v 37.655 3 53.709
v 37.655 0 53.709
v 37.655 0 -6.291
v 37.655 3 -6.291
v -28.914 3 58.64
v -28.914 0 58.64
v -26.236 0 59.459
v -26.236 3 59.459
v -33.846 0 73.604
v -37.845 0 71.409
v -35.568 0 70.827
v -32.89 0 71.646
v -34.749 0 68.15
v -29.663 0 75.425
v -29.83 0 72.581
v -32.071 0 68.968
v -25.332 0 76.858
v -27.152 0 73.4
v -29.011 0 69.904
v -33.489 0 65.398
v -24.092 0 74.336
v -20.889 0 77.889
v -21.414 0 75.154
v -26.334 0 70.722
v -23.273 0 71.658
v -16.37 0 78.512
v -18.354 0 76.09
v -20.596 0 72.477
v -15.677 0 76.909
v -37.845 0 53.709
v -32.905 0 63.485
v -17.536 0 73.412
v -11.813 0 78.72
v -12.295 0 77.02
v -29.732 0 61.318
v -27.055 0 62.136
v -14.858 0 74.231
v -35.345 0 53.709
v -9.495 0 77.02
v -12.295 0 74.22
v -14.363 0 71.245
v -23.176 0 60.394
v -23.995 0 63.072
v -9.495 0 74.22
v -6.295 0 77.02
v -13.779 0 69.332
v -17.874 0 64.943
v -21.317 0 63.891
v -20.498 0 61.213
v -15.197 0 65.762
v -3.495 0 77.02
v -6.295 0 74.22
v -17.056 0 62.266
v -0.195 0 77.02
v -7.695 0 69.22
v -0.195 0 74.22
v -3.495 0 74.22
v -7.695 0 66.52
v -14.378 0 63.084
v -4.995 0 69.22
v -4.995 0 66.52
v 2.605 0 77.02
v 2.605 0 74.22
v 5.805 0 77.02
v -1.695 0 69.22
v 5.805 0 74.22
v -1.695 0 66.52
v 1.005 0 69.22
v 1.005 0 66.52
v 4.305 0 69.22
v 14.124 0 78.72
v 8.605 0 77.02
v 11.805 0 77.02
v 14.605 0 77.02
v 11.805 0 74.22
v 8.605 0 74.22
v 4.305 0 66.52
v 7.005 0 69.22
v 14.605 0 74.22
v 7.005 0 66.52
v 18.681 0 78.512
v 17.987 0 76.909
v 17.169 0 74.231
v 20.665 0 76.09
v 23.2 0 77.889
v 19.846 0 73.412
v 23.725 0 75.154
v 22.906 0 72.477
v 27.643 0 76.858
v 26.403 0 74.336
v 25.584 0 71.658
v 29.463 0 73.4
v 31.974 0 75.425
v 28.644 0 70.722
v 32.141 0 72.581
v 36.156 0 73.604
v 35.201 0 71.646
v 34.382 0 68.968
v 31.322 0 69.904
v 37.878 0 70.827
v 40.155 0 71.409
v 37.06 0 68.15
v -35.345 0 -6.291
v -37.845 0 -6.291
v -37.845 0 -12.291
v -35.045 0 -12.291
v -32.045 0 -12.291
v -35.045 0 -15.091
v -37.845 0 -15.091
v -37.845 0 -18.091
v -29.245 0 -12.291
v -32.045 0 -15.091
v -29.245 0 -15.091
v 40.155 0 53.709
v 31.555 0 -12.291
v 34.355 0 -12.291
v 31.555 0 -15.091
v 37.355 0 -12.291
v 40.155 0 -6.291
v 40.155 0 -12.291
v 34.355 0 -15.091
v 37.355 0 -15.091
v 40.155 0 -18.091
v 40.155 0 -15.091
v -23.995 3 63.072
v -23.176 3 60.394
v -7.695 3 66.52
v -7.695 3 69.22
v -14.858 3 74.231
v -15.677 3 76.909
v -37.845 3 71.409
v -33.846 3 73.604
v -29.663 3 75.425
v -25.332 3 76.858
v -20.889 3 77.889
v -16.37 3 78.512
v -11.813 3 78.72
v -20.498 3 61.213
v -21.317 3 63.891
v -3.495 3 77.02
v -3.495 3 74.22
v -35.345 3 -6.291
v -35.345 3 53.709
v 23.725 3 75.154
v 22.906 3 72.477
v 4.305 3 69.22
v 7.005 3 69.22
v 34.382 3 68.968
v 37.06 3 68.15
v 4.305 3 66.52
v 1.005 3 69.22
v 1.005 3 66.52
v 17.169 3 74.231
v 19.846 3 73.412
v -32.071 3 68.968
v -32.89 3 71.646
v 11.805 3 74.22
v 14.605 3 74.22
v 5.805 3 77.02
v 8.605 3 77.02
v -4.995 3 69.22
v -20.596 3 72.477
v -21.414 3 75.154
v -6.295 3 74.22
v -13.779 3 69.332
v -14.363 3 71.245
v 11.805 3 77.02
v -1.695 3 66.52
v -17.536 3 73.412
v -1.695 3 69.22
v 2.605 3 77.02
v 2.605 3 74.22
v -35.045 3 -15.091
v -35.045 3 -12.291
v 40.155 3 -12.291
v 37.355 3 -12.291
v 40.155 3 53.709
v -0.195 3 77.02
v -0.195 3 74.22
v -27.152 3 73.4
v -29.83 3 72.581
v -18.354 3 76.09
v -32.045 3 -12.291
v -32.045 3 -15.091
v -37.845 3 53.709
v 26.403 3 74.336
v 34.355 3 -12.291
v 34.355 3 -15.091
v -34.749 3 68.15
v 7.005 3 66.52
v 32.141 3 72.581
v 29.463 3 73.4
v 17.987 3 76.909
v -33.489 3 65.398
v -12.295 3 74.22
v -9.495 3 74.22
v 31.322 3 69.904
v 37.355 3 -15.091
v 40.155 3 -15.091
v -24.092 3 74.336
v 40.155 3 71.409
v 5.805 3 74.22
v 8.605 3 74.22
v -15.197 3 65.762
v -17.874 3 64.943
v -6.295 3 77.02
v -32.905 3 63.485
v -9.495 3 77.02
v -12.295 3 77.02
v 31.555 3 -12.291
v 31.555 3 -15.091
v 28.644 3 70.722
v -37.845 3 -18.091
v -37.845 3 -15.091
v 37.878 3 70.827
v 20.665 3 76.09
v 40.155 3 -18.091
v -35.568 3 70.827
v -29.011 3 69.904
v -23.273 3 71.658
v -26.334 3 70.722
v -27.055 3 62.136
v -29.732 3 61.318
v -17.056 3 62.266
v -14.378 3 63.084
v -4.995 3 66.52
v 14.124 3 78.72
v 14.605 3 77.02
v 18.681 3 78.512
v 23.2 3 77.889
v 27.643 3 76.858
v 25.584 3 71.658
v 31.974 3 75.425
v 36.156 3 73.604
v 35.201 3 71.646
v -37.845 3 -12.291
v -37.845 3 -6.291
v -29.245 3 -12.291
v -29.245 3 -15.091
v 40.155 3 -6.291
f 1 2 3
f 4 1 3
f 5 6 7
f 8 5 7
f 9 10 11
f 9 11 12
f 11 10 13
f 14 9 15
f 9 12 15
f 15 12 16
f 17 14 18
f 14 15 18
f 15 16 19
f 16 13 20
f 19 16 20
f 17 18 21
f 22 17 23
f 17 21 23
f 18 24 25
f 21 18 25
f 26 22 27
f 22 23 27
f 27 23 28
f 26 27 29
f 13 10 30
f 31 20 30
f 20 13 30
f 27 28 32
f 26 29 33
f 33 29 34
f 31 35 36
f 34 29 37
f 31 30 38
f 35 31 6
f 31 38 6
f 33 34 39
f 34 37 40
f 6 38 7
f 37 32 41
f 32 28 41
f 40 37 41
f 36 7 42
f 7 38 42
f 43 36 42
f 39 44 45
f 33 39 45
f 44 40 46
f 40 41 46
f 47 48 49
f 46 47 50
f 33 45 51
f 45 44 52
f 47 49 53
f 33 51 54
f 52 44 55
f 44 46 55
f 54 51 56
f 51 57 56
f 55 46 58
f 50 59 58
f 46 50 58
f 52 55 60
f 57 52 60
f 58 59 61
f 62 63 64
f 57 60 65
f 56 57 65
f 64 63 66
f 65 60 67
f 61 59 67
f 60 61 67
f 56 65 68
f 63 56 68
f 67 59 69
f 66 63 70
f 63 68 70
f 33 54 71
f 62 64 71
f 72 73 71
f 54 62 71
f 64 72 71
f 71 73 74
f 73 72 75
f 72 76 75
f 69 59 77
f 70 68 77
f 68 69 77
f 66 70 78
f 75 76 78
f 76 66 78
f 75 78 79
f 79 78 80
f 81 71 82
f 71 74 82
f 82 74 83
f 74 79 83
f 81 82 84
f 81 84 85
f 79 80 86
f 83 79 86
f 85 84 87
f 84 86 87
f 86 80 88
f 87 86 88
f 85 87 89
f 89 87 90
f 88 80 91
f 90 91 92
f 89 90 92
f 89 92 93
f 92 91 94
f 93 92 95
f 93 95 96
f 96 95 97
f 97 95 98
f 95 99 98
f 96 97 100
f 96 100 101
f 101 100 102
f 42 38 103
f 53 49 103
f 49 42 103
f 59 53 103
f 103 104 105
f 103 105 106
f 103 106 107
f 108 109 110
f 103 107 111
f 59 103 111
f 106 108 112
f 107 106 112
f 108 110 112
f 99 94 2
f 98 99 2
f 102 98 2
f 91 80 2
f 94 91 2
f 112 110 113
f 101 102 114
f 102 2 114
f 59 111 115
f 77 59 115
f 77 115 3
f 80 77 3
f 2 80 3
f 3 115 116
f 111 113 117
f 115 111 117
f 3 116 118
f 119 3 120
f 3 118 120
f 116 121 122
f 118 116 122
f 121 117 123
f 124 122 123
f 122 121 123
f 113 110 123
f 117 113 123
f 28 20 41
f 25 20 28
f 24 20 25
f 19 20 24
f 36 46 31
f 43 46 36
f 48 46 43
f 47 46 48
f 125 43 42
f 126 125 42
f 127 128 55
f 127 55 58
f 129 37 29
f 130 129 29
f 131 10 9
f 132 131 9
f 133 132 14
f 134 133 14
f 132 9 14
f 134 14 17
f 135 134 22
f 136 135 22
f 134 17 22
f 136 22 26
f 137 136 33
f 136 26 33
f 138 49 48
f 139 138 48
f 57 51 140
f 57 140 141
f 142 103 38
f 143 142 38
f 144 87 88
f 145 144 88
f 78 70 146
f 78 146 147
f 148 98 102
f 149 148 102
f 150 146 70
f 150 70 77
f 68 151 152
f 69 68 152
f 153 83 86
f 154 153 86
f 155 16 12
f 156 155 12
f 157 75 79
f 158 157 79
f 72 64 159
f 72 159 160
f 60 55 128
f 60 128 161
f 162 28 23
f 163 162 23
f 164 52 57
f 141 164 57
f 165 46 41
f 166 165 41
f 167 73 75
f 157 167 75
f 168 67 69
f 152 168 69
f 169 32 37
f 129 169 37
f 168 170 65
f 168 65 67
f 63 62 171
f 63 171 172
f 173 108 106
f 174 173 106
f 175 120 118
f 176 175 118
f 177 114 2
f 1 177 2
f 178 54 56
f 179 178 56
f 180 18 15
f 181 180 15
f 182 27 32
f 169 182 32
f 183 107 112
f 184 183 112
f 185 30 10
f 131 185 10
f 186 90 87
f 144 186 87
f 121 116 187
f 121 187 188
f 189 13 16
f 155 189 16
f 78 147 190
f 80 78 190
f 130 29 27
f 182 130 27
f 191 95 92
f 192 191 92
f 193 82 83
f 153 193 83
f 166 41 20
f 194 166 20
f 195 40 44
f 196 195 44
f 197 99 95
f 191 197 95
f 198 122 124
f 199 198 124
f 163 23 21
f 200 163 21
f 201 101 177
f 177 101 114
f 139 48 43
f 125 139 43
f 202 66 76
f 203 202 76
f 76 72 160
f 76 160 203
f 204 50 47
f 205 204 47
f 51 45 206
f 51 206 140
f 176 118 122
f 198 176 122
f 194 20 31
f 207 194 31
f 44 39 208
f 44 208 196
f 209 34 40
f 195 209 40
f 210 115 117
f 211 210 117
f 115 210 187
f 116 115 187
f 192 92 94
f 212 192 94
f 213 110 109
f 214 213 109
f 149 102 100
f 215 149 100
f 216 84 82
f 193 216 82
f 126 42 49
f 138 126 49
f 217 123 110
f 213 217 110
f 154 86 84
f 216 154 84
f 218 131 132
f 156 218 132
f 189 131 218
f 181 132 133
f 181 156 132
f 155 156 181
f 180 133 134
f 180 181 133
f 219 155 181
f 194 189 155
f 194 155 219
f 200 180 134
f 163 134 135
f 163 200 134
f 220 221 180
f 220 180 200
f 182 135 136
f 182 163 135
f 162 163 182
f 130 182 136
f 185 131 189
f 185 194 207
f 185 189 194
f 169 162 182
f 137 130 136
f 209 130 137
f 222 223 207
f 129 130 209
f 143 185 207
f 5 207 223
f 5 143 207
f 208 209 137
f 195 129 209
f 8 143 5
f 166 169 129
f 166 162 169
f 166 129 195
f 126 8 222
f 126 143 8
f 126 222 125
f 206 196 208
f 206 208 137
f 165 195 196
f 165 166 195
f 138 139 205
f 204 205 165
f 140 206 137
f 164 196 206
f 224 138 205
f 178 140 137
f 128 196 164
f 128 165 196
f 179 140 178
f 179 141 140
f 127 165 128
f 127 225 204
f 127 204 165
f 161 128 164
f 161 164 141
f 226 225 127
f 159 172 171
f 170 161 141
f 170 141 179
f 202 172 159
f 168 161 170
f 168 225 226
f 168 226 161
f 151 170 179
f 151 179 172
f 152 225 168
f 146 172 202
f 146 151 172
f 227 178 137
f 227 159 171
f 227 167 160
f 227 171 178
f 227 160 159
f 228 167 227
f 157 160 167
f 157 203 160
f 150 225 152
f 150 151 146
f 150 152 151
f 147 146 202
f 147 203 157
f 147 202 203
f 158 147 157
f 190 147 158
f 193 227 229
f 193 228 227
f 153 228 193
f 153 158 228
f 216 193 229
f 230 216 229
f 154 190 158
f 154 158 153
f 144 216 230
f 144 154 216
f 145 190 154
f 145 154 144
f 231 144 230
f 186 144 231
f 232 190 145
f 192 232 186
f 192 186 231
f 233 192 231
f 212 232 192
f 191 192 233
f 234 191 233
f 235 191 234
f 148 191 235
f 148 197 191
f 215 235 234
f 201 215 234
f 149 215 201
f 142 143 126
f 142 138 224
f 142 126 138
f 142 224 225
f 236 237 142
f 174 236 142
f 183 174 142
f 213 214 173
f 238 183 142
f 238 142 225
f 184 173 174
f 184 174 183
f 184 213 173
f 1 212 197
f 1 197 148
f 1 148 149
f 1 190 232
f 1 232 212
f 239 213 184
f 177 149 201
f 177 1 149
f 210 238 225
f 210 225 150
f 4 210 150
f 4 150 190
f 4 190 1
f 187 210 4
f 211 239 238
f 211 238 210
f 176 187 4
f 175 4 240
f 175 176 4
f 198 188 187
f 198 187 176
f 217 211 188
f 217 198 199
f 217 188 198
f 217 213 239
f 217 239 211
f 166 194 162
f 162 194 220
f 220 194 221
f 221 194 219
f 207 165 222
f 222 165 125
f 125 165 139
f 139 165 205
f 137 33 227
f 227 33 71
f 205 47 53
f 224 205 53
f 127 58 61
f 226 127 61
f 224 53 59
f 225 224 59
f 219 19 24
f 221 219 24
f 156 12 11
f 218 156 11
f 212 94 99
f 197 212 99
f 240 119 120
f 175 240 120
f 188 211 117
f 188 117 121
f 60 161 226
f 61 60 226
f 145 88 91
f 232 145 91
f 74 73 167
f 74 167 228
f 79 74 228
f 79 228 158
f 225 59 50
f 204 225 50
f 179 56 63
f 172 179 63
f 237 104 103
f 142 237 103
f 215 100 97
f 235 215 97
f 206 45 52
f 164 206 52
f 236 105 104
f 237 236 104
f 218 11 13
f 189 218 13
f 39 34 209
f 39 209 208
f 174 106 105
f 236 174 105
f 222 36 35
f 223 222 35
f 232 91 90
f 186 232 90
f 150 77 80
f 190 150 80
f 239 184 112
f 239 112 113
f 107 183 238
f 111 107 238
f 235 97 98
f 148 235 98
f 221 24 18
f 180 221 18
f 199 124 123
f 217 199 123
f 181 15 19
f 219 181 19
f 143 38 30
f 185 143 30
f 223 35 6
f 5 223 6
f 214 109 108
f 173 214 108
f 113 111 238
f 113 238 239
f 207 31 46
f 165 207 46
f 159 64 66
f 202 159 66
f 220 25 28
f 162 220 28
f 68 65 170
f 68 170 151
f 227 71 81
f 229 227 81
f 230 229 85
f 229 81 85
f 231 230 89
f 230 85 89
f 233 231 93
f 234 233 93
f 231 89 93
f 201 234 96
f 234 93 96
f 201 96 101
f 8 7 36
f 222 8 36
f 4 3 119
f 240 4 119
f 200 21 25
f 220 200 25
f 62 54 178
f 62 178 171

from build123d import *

# Parameters (mm, degrees)
SKETCH1_W           = 2.8
SKETCH1_H           = 2.8
SKETCH1_W_2         = 2.7
SKETCH1_H_2         = 2.7
BOSS_EXTRUDE1_DEPTH = 3


with BuildPart() as part:
    # Sketch1 → Boss-Extrude1 (new body)
    with BuildSketch(Plane(origin=(0, 0, 0), x_dir=(1, 0, 0), z_dir=(0, 1, 0))):
        with BuildLine():
            Line((-37.844649751, 18.090932989), (-37.844649751, 15.090932989))
            Line((-37.844649751, 15.090932989), (-35.044649751, 15.090932989))
            Line((-35.044649751, 15.090932989), (-35.044649751, 12.290932989))
            Line((-35.044649751, 12.290932989), (-37.844649751, 12.290932989))
            Line((-37.844649751, 12.290932989), (-37.844649751, 6.290932989))
            Line((-37.844649751, 6.290932989), (-35.344649751, 6.290932989))
            Line((-35.344649751, 6.290932989), (-35.344649751, -53.709067011))
            Line((-35.344649751, -53.709067011), (-37.844649751, -53.709067011))
            Line((-37.844649751, -53.709067011), (-37.844649751, -71.409067011))
            ThreePointArc((-37.844649751, -71.409067011), (-25.332467624, -76.857542339), (-11.813147026, -78.719948188))
            Line((-11.813147026, -78.719948188), (-8.844649751, -78.719948188))
            Line((-8.844649751, -78.719948188), (1.155350249, -78.719948188))
            Line((1.155350249, -78.719948188), (11.155350249, -78.719948188))
            Line((11.155350249, -78.719948188), (14.123847524, -78.719948188))
            ThreePointArc((14.123847524, -78.719948188), (27.643168122, -76.857542339), (40.155350249, -71.409067011))
            Line((40.155350249, -71.409067011), (40.155350249, -53.709067011))
            Line((40.155350249, -53.709067011), (37.655350249, -53.709067011))
            Line((37.655350249, -53.709067011), (37.655350249, 6.290932989))
            Line((37.655350249, 6.290932989), (40.155350249, 6.290932989))
            Line((40.155350249, 6.290932989), (40.155350249, 12.290932989))
            Line((40.155350249, 12.290932989), (37.355350249, 12.290932989))
            Line((37.355350249, 12.290932989), (37.355350249, 15.090932989))
            Line((37.355350249, 15.090932989), (40.155350249, 15.090932989))
            Line((40.155350249, 15.090932989), (40.155350249, 18.090932989))
            Line((40.155350249, 18.090932989), (-37.844649751, 18.090932989))
        make_face()
        Polygon((-35.567709863, -70.827218463), (-34.74906909, -68.149565146), (-32.071415773, -68.96820592), (-32.890056546, -71.645859236), align=None, mode=Mode.SUBTRACT)
        Polygon((-29.829881327, -72.581448691), (-29.011240554, -69.903795375), (-26.333587237, -70.722436148), (-27.15222801, -73.400089465), align=None, mode=Mode.SUBTRACT)
        Polygon((-14.857930166, -74.230896605), (-15.676570939, -76.908549921), (-18.354224255, -76.089909148), (-17.535583482, -73.412255831), align=None, mode=Mode.SUBTRACT)
        Polygon((-23.273412018, -71.658025603), (-20.595758701, -72.476666376), (-21.414399475, -75.154319693), (-24.092052791, -74.33567892), align=None, mode=Mode.SUBTRACT)
        Polygon((-33.489432073, -65.39759956), (-32.904688664, -63.484990048), (-13.778593544, -69.332424143), (-14.363336954, -71.245033655), align=None, mode=Mode.SUBTRACT)
        with Locations((-10.894649751, -75.619948559)):
            Rectangle(SKETCH1_W, SKETCH1_H, mode=Mode.SUBTRACT)
        with Locations((-4.894649751, -75.619948559)):
            Rectangle(SKETCH1_W, SKETCH1_H, mode=Mode.SUBTRACT)
        with Locations((-6.344649714, -67.869948559)):
            Rectangle(SKETCH1_W_2, SKETCH1_H_2, mode=Mode.SUBTRACT)
        Polygon((-29.732442135, -61.317767872), (-28.913801362, -58.640114555), (-26.236148045, -59.458755328), (-27.054788818, -62.136408645), align=None, mode=Mode.SUBTRACT)
        Polygon((-23.994613599, -63.0719981), (-23.175972826, -60.394344784), (-20.498319509, -61.212985557), (-21.316960283, -63.890638873), align=None, mode=Mode.SUBTRACT)
        Polygon((-17.055622388, -62.265523694), (-14.377969071, -63.084164467), (-15.196609844, -65.761817784), (-17.874263161, -64.94317701), align=None, mode=Mode.SUBTRACT)
        with Locations((1.205350249, -75.619949313)):
            Rectangle(SKETCH1_W, SKETCH1_H, mode=Mode.SUBTRACT)
        with Locations((-0.344649714, -67.869948559)):
            Rectangle(SKETCH1_W_2, SKETCH1_H_2, mode=Mode.SUBTRACT)
        with Locations((5.655350286, -67.869948559)):
            Rectangle(SKETCH1_W_2, SKETCH1_H_2, mode=Mode.SUBTRACT)
        with Locations((7.205350249, -75.619948559)):
            Rectangle(SKETCH1_W, SKETCH1_H, mode=Mode.SUBTRACT)
        with Locations((13.205350249, -75.619948559)):
            Rectangle(SKETCH1_W, SKETCH1_H, mode=Mode.SUBTRACT)
        Polygon((17.987271436, -76.908549921), (17.168630663, -74.230896605), (19.84628398, -73.412255831), (20.664924753, -76.089909148), align=None, mode=Mode.SUBTRACT)
        Polygon((23.725099972, -75.154319693), (22.906459199, -72.476666376), (25.584112516, -71.658025603), (26.402753289, -74.33567892), align=None, mode=Mode.SUBTRACT)
        Polygon((28.644287735, -70.722436148), (31.321941051, -69.903795375), (32.140581825, -72.581448691), (29.462928508, -73.400089465), align=None, mode=Mode.SUBTRACT)
        Polygon((34.38211627, -68.96820592), (37.059769587, -68.149565146), (37.87841036, -70.827218463), (35.200757044, -71.645859236), align=None, mode=Mode.SUBTRACT)
        with Locations((-30.644649751, 13.690932989)):
            Rectangle(SKETCH1_W, SKETCH1_H, mode=Mode.SUBTRACT)
        with Locations((32.955350249, 13.690932989)):
            Rectangle(SKETCH1_W, SKETCH1_H, mode=Mode.SUBTRACT)
    extrude(amount=BOSS_EXTRUDE1_DEPTH)


solid = part.part
